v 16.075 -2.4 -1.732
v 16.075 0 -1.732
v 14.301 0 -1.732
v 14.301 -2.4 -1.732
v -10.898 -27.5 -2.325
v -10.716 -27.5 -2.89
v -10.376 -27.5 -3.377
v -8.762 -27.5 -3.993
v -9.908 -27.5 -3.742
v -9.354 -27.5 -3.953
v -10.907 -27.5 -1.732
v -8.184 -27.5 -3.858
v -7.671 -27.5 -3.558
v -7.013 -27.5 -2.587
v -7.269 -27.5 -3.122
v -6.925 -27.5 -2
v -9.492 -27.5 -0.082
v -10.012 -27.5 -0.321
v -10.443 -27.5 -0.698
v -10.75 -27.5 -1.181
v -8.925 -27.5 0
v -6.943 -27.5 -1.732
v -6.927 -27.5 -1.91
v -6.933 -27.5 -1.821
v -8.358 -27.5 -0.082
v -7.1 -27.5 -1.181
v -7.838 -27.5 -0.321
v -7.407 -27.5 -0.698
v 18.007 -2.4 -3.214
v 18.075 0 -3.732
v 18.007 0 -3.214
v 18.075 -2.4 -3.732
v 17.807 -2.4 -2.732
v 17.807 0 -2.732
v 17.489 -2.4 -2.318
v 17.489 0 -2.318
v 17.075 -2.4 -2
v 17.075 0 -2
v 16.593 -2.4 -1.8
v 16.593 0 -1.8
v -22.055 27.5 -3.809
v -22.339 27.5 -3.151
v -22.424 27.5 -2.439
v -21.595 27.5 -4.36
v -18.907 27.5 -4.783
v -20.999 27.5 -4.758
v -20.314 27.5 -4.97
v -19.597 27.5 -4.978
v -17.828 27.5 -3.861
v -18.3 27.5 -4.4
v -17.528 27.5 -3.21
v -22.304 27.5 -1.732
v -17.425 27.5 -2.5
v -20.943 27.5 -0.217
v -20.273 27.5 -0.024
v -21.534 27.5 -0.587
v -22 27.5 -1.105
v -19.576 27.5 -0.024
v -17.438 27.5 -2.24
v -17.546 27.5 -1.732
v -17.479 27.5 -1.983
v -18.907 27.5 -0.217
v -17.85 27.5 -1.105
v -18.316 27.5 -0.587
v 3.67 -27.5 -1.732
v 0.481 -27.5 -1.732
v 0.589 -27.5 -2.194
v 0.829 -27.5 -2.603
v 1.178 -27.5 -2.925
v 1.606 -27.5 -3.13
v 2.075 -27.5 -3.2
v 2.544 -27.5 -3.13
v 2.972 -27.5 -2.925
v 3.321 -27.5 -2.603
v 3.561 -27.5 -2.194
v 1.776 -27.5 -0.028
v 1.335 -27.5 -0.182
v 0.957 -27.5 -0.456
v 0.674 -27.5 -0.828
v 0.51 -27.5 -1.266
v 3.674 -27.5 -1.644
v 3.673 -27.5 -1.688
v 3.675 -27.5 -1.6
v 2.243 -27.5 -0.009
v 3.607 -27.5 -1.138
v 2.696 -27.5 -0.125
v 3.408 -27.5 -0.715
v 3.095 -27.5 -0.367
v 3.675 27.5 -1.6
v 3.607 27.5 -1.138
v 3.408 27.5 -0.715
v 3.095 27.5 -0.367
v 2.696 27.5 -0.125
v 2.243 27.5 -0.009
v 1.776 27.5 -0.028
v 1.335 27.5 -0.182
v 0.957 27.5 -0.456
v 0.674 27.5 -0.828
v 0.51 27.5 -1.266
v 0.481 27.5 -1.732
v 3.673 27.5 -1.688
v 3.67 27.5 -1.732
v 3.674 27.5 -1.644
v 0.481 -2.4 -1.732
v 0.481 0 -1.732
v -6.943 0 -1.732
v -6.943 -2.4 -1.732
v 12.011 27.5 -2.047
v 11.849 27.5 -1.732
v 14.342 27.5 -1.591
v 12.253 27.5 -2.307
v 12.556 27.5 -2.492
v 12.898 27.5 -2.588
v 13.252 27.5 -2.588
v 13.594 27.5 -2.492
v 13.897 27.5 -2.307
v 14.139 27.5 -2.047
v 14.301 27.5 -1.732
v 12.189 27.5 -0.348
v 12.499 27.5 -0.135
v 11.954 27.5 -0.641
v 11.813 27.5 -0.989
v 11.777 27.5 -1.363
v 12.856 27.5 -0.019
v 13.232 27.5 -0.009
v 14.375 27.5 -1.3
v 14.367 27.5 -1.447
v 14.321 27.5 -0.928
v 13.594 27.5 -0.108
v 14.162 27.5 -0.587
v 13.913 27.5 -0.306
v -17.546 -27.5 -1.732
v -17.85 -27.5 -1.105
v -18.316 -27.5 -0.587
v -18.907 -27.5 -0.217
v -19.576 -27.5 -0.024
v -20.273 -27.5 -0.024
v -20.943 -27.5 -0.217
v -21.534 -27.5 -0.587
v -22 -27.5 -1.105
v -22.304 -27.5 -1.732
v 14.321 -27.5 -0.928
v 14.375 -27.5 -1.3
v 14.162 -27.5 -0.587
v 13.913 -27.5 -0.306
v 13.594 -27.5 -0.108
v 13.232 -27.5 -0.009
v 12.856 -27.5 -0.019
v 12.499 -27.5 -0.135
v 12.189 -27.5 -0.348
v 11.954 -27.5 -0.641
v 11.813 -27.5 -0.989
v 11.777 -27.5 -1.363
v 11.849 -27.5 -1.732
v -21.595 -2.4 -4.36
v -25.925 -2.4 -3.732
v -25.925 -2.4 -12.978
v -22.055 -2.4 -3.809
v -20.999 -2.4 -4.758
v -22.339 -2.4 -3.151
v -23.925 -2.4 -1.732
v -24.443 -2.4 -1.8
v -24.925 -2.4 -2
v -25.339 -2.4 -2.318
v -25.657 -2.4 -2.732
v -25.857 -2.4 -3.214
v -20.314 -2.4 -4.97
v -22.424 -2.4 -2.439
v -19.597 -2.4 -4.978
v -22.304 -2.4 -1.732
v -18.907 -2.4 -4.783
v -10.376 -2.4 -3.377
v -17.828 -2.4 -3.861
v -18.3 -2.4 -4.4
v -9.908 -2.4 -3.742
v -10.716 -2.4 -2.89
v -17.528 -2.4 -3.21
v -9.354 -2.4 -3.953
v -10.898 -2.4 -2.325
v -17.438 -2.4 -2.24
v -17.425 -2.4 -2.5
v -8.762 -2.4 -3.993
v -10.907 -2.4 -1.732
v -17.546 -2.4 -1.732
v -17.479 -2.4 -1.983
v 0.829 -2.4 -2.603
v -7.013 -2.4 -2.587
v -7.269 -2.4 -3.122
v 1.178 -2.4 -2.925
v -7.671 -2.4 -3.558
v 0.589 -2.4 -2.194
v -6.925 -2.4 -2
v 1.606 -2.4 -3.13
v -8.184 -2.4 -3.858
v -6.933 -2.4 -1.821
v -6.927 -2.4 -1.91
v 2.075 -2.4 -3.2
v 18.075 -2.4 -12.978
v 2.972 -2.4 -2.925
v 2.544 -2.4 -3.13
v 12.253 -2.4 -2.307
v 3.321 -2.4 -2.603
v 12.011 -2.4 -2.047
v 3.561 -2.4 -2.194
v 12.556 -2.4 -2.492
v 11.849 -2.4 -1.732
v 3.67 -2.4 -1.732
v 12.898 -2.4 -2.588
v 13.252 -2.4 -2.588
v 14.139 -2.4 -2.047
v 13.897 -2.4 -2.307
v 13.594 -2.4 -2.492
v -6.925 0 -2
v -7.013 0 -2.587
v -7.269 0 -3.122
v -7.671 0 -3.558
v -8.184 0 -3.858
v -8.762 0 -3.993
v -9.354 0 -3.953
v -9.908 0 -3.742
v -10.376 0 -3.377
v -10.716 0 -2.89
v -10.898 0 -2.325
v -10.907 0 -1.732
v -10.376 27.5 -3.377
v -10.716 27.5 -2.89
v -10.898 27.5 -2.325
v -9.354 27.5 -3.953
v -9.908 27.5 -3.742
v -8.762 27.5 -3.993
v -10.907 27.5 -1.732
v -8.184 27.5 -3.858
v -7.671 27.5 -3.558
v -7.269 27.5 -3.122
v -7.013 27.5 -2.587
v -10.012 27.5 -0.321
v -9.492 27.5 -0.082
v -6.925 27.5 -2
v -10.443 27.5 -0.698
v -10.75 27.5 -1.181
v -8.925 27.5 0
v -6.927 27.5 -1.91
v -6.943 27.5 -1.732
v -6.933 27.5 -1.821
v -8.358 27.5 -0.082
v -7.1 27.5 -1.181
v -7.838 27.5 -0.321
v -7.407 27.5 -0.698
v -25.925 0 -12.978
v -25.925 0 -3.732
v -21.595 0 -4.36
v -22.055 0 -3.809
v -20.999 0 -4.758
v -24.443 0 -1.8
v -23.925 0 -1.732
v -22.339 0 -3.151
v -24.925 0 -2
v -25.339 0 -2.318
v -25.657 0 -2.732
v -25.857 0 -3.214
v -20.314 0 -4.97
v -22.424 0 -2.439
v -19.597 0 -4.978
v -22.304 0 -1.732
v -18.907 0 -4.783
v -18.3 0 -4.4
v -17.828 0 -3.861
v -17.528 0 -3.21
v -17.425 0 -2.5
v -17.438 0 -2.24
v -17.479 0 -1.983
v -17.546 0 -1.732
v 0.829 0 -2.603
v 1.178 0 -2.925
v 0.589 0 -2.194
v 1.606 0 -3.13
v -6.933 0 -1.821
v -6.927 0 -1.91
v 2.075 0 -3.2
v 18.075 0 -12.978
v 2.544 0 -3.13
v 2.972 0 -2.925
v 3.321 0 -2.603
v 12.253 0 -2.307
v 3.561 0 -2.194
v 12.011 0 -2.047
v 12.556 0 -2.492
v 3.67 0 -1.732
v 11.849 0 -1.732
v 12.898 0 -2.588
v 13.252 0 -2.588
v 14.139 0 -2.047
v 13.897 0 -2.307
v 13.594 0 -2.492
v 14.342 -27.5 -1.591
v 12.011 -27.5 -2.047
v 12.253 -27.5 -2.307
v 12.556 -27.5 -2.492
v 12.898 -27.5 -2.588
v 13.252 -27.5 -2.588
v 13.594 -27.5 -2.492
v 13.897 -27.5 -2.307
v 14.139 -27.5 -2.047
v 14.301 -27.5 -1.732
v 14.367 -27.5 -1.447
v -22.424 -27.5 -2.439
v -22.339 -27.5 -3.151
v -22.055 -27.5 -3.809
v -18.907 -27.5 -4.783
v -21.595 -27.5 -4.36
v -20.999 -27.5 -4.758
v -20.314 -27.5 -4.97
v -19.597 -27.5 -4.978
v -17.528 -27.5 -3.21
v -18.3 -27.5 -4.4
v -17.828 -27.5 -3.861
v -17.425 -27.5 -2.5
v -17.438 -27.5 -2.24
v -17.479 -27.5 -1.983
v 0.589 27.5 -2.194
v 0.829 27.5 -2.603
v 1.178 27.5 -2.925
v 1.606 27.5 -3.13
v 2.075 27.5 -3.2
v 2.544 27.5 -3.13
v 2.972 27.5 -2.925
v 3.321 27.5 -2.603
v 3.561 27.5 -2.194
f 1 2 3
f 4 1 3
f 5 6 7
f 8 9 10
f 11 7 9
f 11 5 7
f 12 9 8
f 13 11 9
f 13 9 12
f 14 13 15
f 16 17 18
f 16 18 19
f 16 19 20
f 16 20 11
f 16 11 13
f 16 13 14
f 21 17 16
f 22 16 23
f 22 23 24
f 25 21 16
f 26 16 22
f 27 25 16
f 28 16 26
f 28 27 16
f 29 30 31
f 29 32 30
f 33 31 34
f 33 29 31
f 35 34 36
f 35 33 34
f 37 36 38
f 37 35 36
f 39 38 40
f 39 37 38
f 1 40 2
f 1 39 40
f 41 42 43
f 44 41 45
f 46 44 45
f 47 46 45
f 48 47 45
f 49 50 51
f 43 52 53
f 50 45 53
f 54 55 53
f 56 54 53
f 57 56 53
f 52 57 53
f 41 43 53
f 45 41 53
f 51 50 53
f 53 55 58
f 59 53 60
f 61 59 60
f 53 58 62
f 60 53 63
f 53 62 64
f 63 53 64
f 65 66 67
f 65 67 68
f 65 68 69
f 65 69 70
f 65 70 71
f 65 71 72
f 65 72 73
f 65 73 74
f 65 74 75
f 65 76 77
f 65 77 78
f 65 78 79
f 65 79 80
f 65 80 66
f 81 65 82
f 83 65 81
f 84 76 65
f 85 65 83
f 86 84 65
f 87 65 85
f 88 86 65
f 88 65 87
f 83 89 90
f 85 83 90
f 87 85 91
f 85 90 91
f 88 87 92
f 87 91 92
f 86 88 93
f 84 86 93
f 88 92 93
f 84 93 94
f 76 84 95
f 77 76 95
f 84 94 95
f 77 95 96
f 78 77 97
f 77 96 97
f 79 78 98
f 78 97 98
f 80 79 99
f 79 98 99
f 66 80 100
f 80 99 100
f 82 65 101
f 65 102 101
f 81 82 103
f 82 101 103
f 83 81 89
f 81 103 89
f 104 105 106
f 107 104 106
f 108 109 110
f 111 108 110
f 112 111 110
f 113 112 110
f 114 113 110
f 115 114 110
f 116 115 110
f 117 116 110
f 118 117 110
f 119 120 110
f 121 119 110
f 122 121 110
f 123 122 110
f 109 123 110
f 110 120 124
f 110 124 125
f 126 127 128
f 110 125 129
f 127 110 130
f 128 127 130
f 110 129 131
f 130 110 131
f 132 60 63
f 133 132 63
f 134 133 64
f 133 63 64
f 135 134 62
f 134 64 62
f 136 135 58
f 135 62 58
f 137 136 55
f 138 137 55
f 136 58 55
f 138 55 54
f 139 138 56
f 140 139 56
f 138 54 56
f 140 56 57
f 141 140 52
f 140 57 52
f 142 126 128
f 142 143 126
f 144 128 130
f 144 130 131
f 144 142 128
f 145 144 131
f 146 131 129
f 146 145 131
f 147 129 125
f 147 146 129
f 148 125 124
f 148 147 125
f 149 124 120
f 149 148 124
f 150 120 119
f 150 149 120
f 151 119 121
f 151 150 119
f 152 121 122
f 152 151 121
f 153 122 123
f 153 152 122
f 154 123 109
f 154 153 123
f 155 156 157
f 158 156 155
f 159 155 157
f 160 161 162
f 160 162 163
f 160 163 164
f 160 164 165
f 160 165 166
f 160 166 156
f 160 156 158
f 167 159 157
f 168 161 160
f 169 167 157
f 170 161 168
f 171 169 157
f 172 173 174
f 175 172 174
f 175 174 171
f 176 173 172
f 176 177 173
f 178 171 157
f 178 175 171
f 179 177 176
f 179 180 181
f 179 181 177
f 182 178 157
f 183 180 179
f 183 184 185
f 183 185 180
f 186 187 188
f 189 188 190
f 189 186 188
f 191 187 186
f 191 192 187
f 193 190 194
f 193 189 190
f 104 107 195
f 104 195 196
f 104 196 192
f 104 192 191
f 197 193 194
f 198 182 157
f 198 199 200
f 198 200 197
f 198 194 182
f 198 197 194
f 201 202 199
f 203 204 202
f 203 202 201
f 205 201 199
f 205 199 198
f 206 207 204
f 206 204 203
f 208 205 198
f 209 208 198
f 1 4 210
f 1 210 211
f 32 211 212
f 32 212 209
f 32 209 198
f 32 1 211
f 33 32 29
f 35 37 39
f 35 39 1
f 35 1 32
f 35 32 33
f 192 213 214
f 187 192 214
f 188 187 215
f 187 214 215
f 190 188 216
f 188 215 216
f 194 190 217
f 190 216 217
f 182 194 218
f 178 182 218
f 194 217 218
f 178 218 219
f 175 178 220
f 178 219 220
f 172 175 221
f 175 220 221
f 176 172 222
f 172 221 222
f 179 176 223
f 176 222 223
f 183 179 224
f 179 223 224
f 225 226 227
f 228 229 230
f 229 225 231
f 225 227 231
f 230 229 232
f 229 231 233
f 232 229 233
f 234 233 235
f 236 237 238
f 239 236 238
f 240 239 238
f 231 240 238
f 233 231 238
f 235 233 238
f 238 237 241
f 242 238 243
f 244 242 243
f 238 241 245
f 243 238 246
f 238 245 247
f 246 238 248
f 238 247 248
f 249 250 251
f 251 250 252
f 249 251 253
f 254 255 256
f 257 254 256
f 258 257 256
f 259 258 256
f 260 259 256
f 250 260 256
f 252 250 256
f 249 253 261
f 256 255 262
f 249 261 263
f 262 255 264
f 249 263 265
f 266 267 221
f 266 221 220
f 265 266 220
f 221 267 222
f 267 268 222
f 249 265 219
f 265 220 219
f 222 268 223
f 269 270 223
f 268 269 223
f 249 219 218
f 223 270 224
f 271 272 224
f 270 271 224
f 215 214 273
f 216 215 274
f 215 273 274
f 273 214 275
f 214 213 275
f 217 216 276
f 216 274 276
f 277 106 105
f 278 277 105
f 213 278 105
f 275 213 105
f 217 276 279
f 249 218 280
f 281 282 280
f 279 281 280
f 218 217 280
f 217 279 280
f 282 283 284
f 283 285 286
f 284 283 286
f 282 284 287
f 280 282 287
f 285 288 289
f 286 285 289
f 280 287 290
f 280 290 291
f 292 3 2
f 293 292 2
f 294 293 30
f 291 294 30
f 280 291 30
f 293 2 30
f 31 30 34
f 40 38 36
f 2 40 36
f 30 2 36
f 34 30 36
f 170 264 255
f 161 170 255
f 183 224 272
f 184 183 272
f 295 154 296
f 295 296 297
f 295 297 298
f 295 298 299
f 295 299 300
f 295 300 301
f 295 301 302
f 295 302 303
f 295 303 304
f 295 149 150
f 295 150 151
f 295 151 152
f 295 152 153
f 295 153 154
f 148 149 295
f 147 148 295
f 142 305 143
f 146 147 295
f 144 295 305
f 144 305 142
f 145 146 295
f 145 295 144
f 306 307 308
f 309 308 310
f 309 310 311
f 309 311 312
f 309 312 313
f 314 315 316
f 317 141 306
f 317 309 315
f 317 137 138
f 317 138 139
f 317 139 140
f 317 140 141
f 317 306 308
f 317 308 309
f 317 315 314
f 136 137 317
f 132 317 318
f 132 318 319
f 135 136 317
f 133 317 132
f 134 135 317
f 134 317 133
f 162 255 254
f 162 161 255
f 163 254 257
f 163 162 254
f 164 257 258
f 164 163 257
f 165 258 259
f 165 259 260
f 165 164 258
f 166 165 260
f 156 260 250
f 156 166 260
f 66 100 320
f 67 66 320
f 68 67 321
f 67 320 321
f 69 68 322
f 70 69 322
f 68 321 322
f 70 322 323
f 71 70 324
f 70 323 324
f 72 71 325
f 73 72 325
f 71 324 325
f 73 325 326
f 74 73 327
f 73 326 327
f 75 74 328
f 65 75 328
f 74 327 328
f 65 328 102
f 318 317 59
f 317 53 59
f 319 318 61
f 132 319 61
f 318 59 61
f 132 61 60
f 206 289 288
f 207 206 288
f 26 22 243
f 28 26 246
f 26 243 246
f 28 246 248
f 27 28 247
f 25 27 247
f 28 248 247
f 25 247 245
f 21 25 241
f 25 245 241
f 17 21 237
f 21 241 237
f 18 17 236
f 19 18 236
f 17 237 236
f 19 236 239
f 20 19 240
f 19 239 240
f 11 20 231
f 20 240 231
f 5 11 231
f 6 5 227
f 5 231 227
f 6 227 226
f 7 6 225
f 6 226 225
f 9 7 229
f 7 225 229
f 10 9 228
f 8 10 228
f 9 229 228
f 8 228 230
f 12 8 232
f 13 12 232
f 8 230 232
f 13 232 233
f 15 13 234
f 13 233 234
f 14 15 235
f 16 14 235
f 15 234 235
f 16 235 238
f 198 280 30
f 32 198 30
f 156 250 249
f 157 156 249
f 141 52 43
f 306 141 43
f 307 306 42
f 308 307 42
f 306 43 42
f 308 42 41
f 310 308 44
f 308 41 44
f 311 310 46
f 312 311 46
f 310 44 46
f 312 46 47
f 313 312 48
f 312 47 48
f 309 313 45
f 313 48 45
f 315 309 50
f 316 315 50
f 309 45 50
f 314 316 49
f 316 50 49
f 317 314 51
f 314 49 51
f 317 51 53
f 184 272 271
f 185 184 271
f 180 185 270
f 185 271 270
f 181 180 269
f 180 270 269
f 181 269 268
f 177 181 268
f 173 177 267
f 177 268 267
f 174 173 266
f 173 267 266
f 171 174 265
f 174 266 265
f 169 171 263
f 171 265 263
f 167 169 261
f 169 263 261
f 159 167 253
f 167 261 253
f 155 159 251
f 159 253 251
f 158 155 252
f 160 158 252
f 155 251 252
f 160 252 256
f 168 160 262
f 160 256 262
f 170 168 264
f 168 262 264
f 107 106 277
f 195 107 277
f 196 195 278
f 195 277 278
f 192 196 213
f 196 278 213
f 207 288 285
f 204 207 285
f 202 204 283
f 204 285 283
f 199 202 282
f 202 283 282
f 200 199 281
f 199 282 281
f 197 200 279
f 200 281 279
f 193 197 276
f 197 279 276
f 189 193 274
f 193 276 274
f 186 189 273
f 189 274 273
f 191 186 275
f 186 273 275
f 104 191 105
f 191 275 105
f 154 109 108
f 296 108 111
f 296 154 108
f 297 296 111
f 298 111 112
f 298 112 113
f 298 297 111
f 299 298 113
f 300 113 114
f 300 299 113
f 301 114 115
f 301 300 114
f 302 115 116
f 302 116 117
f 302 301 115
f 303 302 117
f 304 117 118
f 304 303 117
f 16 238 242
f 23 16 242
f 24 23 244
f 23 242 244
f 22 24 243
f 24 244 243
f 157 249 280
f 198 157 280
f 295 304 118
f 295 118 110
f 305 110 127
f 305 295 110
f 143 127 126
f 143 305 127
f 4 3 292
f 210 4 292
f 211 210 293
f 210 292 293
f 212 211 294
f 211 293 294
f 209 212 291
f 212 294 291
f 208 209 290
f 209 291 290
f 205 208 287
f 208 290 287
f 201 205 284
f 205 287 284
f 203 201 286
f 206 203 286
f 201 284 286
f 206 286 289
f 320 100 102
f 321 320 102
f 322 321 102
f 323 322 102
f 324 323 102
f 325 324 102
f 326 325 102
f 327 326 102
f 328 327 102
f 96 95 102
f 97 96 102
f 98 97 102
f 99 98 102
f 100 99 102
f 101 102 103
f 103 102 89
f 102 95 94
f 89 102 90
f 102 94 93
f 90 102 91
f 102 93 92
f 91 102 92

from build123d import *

# Parameters (mm, degrees)
F1_DEPTH = 27.5
F2_DEPTH = 2.4
F3_R     = 2


with BuildPart() as f1:
    # F0 (on Front) → F1 (new body, symmetric)
    with BuildSketch(Plane.XZ):
        with BuildLine():
            ThreePointArc((-22.304044, -1.732091), (-20.313583, -4.969601), (-17.424902, -2.5))
            ThreePointArc((-17.424902, -2.5), (-17.455301, -2.111319), (-17.54576, -1.732091))
            Line((-17.54576, -1.732091), (-22.304044, -1.732091))
        make_face()
        with BuildLine():
            ThreePointArc((-6.942927, -1.732091), (-8.924902, 0), (-10.906877, -1.732091))
            Line((-10.906877, -1.732091), (-6.942927, -1.732091))
        make_face()
        with BuildLine():
            Line((-6.942927, -1.732091), (-10.906877, -1.732091))
            ThreePointArc((-10.906877, -1.732091), (-9.059159, -3.995489), (-6.924902, -2))
            ThreePointArc((-6.924902, -2), (-6.929413, -1.865743), (-6.942927, -1.732091))
        make_face()
        with BuildLine():
            Line((3.669636, -1.732091), (0.48056, -1.732091))
            ThreePointArc((0.48056, -1.732091), (2.075098, -3.2), (3.669636, -1.732091))
        make_face()
        with BuildLine():
            ThreePointArc((3.675098, -1.6), (2.008996, -0.001366), (0.48056, -1.732091))
            Line((0.48056, -1.732091), (3.669636, -1.732091))
            ThreePointArc((3.669636, -1.732091), (3.673732, -1.666102), (3.675098, -1.6))
        make_face()
        with BuildLine():
            Line((-22.304044, -1.732091), (-17.54576, -1.732091))
            ThreePointArc((-17.54576, -1.732091), (-19.924902, 0), (-22.304044, -1.732091))
        make_face()
        with BuildLine():
            Line((14.301188, -1.732091), (11.849008, -1.732091))
            ThreePointArc((11.849008, -1.732091), (13.075098, -2.6), (14.301188, -1.732091))
        make_face()
        with BuildLine():
            ThreePointArc((14.375098, -1.3), (12.855915, -0.018611), (11.849008, -1.732091))
            Line((11.849008, -1.732091), (14.301188, -1.732091))
            ThreePointArc((14.301188, -1.732091), (14.356487, -1.519183), (14.375098, -1.3))
        make_face()
    extrude(amount=F1_DEPTH, both=True)


with BuildPart() as f2:
    # F0 (on Front) → F2 (new body)
    with BuildSketch(Plane.XZ):
        with BuildLine():
            ThreePointArc((-17.54576, -1.732091), (-17.455301, -2.111319), (-17.424902, -2.5))
            ThreePointArc((-17.424902, -2.5), (-20.313583, -4.969601), (-22.304044, -1.732091))
            Line((-22.304044, -1.732091), (-25.924902, -1.732091))
            Line((-25.924902, -1.732091), (-25.924902, -12.978235))
            Line((-25.924902, -12.978235), (18.075098, -12.978235))
            Line((18.075098, -12.978235), (18.075098, -1.732091))
            Line((18.075098, -1.732091), (14.301188, -1.732091))
            ThreePointArc((14.301188, -1.732091), (13.075098, -2.6), (11.849008, -1.732091))
            Line((11.849008, -1.732091), (3.669636, -1.732091))
            ThreePointArc((3.669636, -1.732091), (2.075098, -3.2), (0.48056, -1.732091))
            Line((0.48056, -1.732091), (-6.942927, -1.732091))
            ThreePointArc((-6.942927, -1.732091), (-6.929413, -1.865743), (-6.924902, -2))
            ThreePointArc((-6.924902, -2), (-9.059159, -3.995489), (-10.906877, -1.732091))
            Line((-10.906877, -1.732091), (-17.54576, -1.732091))
        make_face()
    extrude(amount=F2_DEPTH)

    # F3
    f3_edges = [f2.edges().sort_by_distance(p)[0] for p in [
        (18.075098, -1.2, -1.732091),
        (-25.924902, -1.2, -1.732091),
    ]]
    fillet(f3_edges, radius=F3_R)


solid = Compound([f1.part, f2.part])
